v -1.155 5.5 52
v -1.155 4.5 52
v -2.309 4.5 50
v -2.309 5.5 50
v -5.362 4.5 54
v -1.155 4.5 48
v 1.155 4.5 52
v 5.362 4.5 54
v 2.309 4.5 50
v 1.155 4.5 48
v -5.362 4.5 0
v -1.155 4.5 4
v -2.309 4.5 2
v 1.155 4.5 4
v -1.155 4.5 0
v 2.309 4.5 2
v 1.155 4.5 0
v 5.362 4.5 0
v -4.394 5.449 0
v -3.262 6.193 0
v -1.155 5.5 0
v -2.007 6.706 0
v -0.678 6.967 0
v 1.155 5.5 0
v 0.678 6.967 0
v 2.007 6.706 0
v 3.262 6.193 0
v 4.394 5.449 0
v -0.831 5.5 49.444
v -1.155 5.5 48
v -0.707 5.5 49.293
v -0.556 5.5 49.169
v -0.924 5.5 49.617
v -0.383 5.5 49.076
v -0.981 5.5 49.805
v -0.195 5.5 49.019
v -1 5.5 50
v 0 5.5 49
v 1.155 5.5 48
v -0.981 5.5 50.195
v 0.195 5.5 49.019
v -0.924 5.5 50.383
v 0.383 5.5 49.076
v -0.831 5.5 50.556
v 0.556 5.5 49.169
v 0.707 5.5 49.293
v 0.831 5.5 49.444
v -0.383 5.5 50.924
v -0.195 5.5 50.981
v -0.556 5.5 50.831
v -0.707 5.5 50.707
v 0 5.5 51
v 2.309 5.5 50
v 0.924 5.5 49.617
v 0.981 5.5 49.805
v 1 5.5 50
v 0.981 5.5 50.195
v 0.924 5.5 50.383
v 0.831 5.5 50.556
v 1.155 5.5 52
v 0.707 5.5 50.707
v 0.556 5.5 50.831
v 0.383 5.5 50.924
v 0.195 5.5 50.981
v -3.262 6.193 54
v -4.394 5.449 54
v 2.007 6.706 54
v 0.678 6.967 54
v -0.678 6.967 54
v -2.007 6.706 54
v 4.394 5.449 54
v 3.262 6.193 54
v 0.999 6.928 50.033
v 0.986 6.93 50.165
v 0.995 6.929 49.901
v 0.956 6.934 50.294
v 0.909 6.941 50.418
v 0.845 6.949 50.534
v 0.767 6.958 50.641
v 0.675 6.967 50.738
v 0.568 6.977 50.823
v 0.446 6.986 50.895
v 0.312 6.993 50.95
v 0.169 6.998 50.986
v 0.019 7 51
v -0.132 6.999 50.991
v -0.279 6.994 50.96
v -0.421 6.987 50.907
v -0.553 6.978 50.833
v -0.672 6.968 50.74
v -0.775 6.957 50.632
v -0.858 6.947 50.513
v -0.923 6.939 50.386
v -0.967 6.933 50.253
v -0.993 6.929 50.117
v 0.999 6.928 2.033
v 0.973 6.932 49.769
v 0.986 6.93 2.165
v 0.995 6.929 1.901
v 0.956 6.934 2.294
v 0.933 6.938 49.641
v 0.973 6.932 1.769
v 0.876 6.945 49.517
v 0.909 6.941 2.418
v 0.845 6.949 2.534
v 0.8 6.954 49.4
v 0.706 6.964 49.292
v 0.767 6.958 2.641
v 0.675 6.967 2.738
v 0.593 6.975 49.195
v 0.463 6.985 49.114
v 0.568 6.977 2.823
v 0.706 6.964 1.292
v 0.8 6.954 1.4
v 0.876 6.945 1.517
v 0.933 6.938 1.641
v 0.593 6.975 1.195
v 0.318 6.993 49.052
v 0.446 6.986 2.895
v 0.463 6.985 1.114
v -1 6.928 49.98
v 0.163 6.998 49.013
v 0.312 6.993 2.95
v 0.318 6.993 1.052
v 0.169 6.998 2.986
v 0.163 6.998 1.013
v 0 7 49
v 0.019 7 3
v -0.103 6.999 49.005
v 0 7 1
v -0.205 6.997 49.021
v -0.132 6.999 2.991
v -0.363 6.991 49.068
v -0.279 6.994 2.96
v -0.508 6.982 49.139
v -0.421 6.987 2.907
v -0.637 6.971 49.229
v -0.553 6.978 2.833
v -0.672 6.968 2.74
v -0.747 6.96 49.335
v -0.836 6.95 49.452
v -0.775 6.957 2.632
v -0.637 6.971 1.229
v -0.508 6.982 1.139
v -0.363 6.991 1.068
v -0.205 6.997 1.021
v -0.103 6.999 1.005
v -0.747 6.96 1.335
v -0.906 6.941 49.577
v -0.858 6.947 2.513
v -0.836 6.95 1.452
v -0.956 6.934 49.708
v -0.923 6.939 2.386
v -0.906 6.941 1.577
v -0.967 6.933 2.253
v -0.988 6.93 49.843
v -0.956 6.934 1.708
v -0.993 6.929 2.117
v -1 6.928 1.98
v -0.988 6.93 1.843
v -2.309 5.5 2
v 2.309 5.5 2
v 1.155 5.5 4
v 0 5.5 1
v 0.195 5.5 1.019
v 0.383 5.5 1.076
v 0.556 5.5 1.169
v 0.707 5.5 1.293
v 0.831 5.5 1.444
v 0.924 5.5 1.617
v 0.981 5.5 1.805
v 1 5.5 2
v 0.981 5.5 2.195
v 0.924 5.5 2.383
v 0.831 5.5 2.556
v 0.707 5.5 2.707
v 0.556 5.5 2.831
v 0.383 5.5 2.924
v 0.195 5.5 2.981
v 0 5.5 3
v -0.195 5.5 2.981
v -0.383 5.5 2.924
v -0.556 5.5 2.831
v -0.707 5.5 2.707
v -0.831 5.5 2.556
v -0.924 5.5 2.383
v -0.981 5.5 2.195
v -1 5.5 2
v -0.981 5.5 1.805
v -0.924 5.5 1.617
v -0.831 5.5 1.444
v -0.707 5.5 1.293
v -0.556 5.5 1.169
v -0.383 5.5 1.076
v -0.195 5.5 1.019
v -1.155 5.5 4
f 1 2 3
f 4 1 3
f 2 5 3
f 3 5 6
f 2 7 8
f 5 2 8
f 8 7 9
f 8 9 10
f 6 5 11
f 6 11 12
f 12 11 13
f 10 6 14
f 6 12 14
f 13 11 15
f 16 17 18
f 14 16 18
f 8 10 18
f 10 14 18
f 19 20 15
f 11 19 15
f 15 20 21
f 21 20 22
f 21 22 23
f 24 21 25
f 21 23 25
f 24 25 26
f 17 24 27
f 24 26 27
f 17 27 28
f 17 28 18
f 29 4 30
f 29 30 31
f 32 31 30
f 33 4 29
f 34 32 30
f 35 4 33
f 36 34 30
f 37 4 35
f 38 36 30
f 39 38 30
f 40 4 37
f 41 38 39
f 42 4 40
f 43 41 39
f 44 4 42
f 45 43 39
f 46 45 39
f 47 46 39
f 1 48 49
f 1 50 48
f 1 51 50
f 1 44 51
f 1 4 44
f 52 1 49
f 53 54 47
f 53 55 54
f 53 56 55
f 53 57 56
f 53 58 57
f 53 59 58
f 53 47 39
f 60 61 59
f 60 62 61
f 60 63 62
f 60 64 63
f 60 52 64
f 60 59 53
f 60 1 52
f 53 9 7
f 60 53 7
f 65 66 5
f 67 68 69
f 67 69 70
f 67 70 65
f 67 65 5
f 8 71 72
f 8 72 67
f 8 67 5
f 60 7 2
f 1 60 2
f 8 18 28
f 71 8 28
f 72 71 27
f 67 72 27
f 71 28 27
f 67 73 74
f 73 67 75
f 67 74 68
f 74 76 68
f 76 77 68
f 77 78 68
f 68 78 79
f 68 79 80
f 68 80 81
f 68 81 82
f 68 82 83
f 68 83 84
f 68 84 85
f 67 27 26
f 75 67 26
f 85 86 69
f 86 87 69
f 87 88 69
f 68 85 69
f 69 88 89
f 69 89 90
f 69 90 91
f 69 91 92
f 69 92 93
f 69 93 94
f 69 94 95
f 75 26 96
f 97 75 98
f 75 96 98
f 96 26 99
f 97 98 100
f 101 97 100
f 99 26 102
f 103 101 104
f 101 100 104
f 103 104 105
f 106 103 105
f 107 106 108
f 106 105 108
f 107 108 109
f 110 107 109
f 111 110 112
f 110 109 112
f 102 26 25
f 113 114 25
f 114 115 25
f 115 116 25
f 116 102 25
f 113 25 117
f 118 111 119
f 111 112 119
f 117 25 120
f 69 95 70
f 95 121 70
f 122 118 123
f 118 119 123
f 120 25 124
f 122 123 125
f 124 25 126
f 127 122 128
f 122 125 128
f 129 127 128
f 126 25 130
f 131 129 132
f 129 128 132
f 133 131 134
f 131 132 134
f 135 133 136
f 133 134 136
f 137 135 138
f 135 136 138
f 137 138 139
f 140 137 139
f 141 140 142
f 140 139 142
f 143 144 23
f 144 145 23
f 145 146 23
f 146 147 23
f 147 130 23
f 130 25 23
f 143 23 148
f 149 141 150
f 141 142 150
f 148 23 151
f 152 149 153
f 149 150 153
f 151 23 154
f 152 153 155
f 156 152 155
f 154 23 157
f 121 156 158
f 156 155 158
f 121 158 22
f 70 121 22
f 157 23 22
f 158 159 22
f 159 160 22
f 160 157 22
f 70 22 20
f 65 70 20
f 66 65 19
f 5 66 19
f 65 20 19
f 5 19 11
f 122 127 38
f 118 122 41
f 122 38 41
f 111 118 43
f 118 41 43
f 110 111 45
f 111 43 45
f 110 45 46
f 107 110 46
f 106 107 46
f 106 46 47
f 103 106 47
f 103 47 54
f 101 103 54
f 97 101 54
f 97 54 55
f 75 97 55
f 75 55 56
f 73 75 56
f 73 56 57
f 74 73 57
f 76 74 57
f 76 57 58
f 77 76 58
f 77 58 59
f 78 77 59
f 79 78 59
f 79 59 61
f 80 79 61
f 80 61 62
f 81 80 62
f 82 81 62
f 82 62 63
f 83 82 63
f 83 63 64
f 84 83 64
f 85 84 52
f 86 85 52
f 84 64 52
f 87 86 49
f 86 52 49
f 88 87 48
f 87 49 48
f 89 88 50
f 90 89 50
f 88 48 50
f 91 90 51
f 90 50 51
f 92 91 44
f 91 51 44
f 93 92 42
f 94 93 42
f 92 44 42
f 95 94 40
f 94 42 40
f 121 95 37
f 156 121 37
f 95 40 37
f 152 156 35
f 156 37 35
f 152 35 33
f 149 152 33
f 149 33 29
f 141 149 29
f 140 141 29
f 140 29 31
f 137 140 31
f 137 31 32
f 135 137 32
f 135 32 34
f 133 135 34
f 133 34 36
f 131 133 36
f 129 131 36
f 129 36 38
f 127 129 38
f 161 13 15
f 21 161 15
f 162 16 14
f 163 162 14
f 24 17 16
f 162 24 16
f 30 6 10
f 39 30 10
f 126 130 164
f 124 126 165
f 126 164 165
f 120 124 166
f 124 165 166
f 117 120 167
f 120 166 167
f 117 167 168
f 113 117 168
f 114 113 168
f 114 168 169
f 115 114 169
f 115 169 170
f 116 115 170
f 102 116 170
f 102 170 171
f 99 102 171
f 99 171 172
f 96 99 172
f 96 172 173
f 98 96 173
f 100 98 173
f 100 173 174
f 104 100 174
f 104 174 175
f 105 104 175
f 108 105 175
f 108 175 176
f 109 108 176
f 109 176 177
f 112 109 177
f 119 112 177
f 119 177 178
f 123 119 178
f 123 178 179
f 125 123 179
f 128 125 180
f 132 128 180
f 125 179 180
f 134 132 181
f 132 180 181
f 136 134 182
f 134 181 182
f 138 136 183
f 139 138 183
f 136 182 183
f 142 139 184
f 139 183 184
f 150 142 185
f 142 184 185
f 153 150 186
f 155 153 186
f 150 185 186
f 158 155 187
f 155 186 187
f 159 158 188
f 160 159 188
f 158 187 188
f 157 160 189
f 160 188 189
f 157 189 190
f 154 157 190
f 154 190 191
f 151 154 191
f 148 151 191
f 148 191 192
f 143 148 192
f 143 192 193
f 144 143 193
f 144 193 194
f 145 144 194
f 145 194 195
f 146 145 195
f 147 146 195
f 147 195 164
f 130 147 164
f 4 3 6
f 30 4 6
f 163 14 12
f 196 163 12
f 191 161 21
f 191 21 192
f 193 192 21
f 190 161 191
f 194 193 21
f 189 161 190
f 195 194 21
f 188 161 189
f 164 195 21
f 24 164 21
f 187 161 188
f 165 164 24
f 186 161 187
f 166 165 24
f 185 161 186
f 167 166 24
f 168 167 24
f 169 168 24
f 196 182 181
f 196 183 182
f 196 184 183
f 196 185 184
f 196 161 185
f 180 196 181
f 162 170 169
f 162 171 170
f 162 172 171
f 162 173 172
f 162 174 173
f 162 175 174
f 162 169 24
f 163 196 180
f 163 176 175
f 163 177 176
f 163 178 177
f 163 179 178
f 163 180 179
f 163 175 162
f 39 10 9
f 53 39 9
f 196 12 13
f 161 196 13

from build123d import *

# Parameters (mm, degrees)
BOSS_EXTRUDE1_DEPTH = 54
CUT_EXTRUDE1_DEPTH  = 1
SKETCH3_R           = 1
CUT_EXTRUDE2_DEPTH  = 55.286278193


with BuildPart() as part:
    # Sketch1 → Boss-Extrude1 (new body)
    with BuildSketch(Plane.XY):
        with BuildLine():
            ThreePointArc((5.361902647, 4.5), (0, 7), (-5.361902647, 4.5))
            Line((-5.361902647, 4.5), (5.361902647, 4.5))
        make_face()
    extrude(amount=BOSS_EXTRUDE1_DEPTH)

    # Sketch2 → Cut-Extrude1 (cut)
    with BuildSketch(Plane.XZ.offset(-4.5)):
        Polygon((2.309401077, 50), (1.154700538, 52), (-1.154700538, 52), (-2.309401077, 50), (-1.154700538, 48), (1.154700538, 48), align=None)
        Polygon((2.309401077, 2), (1.154700538, 4), (-1.154700538, 4), (-2.309401077, 2), (-1.154700538, 0), (1.154700538, 0), align=None)
    extrude(amount=-CUT_EXTRUDE1_DEPTH, mode=Mode.SUBTRACT)

    # Sketch3 → Cut-Extrude2 (cut, through all)
    with BuildSketch(Plane.XZ.offset(-5.5)):
        with Locations(Location((0, 2, 0), (0, 0, 270))):
            Circle(SKETCH3_R)
        with Locations(Location((0, 50, 0), (0, 0, 270))):
            Circle(SKETCH3_R)
    extrude(amount=-CUT_EXTRUDE2_DEPTH, mode=Mode.SUBTRACT)


solid = part.part
